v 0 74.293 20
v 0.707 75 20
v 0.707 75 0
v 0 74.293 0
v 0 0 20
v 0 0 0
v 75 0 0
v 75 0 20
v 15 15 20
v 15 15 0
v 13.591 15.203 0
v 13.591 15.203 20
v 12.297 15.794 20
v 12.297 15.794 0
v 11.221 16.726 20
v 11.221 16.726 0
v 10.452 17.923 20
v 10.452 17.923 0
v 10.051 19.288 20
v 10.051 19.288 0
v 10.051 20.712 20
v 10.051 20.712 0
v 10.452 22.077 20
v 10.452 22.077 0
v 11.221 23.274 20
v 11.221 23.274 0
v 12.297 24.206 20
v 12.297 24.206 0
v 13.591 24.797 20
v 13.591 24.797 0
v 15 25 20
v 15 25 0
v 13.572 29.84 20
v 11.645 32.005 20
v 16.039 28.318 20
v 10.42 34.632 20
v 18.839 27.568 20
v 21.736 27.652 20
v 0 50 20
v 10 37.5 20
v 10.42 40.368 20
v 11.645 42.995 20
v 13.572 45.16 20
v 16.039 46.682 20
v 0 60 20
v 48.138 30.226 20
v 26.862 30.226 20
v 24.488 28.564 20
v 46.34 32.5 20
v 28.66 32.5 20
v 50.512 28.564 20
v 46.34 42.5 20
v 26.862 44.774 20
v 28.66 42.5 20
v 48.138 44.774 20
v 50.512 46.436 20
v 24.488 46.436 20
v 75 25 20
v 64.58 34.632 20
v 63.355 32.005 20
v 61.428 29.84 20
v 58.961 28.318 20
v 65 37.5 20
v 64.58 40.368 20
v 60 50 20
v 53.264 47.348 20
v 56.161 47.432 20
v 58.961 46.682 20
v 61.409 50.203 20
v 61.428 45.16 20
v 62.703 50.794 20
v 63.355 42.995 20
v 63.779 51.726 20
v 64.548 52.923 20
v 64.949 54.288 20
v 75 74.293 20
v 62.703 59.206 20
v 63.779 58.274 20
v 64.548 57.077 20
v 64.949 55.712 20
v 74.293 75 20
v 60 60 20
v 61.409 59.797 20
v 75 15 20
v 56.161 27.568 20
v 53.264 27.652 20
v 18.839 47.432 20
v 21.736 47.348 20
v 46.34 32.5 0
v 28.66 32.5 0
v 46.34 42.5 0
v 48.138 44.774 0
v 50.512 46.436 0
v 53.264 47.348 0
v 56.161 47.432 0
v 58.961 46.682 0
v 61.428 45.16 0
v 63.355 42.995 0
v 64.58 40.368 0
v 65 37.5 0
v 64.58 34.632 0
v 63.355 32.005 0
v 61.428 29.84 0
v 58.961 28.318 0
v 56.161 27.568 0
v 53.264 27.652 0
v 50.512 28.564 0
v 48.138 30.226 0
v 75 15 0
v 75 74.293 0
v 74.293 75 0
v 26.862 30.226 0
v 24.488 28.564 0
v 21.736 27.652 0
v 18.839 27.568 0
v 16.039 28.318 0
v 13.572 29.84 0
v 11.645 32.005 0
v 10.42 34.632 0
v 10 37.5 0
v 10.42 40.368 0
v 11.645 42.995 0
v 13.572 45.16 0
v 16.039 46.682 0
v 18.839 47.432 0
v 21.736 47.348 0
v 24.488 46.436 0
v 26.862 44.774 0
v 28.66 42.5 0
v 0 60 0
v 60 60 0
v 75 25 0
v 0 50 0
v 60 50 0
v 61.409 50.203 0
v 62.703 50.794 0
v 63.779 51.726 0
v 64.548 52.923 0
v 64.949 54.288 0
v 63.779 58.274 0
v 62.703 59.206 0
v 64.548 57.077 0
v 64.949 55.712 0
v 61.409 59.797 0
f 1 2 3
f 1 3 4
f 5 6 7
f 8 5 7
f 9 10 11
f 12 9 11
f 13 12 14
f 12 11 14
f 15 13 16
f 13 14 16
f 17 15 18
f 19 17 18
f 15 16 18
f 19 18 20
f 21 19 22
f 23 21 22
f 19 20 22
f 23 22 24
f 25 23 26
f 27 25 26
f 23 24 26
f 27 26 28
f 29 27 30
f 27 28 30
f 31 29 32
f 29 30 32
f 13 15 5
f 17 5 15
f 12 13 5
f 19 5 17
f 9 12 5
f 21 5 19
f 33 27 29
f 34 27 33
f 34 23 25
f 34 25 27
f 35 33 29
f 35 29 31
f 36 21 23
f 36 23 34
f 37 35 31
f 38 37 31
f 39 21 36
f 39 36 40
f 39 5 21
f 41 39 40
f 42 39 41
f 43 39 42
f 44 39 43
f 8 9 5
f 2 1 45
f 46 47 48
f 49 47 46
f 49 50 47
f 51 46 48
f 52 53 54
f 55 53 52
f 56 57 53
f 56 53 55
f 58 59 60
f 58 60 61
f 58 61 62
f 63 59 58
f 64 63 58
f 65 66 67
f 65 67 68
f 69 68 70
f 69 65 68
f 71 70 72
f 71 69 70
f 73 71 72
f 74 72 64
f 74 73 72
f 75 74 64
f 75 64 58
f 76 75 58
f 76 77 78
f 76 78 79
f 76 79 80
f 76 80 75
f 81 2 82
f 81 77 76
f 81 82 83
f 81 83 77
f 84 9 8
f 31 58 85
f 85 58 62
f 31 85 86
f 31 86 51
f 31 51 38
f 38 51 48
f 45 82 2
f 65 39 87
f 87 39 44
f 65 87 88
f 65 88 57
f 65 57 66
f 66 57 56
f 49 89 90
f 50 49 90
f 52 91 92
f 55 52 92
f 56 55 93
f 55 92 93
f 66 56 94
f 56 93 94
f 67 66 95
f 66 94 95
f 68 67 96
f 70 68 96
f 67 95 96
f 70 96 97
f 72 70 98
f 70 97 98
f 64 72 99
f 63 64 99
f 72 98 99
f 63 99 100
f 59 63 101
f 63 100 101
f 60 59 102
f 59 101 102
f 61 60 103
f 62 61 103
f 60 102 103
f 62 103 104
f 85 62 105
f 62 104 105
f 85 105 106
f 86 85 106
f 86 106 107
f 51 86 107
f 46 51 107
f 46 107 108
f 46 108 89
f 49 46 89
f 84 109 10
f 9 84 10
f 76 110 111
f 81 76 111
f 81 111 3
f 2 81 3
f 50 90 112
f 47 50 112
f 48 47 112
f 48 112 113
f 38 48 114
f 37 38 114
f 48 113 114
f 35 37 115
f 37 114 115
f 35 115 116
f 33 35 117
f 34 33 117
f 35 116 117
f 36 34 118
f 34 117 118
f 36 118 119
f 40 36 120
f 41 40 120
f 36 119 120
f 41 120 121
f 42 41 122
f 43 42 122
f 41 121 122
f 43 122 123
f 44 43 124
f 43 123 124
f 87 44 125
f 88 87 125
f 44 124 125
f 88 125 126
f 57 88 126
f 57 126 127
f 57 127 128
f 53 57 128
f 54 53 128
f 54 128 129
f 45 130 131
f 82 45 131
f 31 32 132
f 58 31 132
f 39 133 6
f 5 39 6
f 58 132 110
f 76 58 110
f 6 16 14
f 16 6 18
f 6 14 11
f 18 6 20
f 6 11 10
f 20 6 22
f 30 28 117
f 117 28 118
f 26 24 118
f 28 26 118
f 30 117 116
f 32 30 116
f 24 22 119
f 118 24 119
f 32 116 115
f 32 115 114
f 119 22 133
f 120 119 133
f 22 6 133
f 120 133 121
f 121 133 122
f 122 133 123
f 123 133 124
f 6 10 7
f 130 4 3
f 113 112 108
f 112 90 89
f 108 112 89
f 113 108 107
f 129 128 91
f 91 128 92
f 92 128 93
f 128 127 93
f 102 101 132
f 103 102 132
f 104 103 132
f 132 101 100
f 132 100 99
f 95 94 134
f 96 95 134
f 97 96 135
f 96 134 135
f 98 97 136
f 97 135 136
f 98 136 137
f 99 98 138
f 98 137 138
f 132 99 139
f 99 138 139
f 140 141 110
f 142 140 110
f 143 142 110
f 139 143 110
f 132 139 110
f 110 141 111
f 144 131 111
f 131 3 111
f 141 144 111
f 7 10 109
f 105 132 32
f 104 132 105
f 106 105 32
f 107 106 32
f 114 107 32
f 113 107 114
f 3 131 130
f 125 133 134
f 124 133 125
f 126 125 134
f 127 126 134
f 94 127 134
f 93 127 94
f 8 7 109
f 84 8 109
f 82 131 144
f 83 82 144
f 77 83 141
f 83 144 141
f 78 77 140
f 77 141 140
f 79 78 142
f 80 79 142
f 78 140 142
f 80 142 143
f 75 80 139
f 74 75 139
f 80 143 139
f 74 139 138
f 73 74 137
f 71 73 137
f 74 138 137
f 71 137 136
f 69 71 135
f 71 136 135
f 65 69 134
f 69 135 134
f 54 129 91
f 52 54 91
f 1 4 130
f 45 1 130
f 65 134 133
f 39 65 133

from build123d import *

# Parameters (mm, degrees)
BOSS_EXTRU_1_DEPTH      = 20
ENL_V_MAT_EXTRU_3_DEPTH = 108.935165725


with BuildPart() as part:
    # Esquisse1 → Boss.-Extru.1 (new body)
    with BuildSketch(Plane.XY):
        with BuildLine():
            Line((0, 50), (0, 0))
            Line((0, 0), (75, 0))
            Line((75, 0), (75, 15))
            Line((75, 15), (15, 15))
            ThreePointArc((15, 15), (10, 20), (15, 25))
            Line((15, 25), (75, 25))
            Line((75, 25), (75, 74.292893219))
            Line((75, 74.292893219), (74.292893219, 75))
            Line((74.292893219, 75), (0.707106781, 75))
            Line((0.707106781, 75), (0, 74.292893219))
            Line((0, 74.292893219), (0, 60))
            Line((0, 60), (60, 60))
            ThreePointArc((60, 60), (65, 55), (60, 50))
            Line((60, 50), (0, 50))
        make_face()
    extrude(amount=BOSS_EXTRU_1_DEPTH)

    # Esquisse2 → Enlèv. mat.-Extru.3 (cut, through all)
    with BuildSketch(Plane.XY):
        with BuildLine():
            Line((28.660254038, 42.5), (46.339745962, 42.5))
            ThreePointArc((46.339745962, 42.5), (65, 37.5), (46.339745962, 32.5))
            Line((46.339745962, 32.5), (28.660254038, 32.5))
            ThreePointArc((28.660254038, 32.5), (10, 37.5), (28.660254038, 42.5))
        make_face()
    extrude(amount=ENL_V_MAT_EXTRU_3_DEPTH, mode=Mode.SUBTRACT)


solid = part.part
